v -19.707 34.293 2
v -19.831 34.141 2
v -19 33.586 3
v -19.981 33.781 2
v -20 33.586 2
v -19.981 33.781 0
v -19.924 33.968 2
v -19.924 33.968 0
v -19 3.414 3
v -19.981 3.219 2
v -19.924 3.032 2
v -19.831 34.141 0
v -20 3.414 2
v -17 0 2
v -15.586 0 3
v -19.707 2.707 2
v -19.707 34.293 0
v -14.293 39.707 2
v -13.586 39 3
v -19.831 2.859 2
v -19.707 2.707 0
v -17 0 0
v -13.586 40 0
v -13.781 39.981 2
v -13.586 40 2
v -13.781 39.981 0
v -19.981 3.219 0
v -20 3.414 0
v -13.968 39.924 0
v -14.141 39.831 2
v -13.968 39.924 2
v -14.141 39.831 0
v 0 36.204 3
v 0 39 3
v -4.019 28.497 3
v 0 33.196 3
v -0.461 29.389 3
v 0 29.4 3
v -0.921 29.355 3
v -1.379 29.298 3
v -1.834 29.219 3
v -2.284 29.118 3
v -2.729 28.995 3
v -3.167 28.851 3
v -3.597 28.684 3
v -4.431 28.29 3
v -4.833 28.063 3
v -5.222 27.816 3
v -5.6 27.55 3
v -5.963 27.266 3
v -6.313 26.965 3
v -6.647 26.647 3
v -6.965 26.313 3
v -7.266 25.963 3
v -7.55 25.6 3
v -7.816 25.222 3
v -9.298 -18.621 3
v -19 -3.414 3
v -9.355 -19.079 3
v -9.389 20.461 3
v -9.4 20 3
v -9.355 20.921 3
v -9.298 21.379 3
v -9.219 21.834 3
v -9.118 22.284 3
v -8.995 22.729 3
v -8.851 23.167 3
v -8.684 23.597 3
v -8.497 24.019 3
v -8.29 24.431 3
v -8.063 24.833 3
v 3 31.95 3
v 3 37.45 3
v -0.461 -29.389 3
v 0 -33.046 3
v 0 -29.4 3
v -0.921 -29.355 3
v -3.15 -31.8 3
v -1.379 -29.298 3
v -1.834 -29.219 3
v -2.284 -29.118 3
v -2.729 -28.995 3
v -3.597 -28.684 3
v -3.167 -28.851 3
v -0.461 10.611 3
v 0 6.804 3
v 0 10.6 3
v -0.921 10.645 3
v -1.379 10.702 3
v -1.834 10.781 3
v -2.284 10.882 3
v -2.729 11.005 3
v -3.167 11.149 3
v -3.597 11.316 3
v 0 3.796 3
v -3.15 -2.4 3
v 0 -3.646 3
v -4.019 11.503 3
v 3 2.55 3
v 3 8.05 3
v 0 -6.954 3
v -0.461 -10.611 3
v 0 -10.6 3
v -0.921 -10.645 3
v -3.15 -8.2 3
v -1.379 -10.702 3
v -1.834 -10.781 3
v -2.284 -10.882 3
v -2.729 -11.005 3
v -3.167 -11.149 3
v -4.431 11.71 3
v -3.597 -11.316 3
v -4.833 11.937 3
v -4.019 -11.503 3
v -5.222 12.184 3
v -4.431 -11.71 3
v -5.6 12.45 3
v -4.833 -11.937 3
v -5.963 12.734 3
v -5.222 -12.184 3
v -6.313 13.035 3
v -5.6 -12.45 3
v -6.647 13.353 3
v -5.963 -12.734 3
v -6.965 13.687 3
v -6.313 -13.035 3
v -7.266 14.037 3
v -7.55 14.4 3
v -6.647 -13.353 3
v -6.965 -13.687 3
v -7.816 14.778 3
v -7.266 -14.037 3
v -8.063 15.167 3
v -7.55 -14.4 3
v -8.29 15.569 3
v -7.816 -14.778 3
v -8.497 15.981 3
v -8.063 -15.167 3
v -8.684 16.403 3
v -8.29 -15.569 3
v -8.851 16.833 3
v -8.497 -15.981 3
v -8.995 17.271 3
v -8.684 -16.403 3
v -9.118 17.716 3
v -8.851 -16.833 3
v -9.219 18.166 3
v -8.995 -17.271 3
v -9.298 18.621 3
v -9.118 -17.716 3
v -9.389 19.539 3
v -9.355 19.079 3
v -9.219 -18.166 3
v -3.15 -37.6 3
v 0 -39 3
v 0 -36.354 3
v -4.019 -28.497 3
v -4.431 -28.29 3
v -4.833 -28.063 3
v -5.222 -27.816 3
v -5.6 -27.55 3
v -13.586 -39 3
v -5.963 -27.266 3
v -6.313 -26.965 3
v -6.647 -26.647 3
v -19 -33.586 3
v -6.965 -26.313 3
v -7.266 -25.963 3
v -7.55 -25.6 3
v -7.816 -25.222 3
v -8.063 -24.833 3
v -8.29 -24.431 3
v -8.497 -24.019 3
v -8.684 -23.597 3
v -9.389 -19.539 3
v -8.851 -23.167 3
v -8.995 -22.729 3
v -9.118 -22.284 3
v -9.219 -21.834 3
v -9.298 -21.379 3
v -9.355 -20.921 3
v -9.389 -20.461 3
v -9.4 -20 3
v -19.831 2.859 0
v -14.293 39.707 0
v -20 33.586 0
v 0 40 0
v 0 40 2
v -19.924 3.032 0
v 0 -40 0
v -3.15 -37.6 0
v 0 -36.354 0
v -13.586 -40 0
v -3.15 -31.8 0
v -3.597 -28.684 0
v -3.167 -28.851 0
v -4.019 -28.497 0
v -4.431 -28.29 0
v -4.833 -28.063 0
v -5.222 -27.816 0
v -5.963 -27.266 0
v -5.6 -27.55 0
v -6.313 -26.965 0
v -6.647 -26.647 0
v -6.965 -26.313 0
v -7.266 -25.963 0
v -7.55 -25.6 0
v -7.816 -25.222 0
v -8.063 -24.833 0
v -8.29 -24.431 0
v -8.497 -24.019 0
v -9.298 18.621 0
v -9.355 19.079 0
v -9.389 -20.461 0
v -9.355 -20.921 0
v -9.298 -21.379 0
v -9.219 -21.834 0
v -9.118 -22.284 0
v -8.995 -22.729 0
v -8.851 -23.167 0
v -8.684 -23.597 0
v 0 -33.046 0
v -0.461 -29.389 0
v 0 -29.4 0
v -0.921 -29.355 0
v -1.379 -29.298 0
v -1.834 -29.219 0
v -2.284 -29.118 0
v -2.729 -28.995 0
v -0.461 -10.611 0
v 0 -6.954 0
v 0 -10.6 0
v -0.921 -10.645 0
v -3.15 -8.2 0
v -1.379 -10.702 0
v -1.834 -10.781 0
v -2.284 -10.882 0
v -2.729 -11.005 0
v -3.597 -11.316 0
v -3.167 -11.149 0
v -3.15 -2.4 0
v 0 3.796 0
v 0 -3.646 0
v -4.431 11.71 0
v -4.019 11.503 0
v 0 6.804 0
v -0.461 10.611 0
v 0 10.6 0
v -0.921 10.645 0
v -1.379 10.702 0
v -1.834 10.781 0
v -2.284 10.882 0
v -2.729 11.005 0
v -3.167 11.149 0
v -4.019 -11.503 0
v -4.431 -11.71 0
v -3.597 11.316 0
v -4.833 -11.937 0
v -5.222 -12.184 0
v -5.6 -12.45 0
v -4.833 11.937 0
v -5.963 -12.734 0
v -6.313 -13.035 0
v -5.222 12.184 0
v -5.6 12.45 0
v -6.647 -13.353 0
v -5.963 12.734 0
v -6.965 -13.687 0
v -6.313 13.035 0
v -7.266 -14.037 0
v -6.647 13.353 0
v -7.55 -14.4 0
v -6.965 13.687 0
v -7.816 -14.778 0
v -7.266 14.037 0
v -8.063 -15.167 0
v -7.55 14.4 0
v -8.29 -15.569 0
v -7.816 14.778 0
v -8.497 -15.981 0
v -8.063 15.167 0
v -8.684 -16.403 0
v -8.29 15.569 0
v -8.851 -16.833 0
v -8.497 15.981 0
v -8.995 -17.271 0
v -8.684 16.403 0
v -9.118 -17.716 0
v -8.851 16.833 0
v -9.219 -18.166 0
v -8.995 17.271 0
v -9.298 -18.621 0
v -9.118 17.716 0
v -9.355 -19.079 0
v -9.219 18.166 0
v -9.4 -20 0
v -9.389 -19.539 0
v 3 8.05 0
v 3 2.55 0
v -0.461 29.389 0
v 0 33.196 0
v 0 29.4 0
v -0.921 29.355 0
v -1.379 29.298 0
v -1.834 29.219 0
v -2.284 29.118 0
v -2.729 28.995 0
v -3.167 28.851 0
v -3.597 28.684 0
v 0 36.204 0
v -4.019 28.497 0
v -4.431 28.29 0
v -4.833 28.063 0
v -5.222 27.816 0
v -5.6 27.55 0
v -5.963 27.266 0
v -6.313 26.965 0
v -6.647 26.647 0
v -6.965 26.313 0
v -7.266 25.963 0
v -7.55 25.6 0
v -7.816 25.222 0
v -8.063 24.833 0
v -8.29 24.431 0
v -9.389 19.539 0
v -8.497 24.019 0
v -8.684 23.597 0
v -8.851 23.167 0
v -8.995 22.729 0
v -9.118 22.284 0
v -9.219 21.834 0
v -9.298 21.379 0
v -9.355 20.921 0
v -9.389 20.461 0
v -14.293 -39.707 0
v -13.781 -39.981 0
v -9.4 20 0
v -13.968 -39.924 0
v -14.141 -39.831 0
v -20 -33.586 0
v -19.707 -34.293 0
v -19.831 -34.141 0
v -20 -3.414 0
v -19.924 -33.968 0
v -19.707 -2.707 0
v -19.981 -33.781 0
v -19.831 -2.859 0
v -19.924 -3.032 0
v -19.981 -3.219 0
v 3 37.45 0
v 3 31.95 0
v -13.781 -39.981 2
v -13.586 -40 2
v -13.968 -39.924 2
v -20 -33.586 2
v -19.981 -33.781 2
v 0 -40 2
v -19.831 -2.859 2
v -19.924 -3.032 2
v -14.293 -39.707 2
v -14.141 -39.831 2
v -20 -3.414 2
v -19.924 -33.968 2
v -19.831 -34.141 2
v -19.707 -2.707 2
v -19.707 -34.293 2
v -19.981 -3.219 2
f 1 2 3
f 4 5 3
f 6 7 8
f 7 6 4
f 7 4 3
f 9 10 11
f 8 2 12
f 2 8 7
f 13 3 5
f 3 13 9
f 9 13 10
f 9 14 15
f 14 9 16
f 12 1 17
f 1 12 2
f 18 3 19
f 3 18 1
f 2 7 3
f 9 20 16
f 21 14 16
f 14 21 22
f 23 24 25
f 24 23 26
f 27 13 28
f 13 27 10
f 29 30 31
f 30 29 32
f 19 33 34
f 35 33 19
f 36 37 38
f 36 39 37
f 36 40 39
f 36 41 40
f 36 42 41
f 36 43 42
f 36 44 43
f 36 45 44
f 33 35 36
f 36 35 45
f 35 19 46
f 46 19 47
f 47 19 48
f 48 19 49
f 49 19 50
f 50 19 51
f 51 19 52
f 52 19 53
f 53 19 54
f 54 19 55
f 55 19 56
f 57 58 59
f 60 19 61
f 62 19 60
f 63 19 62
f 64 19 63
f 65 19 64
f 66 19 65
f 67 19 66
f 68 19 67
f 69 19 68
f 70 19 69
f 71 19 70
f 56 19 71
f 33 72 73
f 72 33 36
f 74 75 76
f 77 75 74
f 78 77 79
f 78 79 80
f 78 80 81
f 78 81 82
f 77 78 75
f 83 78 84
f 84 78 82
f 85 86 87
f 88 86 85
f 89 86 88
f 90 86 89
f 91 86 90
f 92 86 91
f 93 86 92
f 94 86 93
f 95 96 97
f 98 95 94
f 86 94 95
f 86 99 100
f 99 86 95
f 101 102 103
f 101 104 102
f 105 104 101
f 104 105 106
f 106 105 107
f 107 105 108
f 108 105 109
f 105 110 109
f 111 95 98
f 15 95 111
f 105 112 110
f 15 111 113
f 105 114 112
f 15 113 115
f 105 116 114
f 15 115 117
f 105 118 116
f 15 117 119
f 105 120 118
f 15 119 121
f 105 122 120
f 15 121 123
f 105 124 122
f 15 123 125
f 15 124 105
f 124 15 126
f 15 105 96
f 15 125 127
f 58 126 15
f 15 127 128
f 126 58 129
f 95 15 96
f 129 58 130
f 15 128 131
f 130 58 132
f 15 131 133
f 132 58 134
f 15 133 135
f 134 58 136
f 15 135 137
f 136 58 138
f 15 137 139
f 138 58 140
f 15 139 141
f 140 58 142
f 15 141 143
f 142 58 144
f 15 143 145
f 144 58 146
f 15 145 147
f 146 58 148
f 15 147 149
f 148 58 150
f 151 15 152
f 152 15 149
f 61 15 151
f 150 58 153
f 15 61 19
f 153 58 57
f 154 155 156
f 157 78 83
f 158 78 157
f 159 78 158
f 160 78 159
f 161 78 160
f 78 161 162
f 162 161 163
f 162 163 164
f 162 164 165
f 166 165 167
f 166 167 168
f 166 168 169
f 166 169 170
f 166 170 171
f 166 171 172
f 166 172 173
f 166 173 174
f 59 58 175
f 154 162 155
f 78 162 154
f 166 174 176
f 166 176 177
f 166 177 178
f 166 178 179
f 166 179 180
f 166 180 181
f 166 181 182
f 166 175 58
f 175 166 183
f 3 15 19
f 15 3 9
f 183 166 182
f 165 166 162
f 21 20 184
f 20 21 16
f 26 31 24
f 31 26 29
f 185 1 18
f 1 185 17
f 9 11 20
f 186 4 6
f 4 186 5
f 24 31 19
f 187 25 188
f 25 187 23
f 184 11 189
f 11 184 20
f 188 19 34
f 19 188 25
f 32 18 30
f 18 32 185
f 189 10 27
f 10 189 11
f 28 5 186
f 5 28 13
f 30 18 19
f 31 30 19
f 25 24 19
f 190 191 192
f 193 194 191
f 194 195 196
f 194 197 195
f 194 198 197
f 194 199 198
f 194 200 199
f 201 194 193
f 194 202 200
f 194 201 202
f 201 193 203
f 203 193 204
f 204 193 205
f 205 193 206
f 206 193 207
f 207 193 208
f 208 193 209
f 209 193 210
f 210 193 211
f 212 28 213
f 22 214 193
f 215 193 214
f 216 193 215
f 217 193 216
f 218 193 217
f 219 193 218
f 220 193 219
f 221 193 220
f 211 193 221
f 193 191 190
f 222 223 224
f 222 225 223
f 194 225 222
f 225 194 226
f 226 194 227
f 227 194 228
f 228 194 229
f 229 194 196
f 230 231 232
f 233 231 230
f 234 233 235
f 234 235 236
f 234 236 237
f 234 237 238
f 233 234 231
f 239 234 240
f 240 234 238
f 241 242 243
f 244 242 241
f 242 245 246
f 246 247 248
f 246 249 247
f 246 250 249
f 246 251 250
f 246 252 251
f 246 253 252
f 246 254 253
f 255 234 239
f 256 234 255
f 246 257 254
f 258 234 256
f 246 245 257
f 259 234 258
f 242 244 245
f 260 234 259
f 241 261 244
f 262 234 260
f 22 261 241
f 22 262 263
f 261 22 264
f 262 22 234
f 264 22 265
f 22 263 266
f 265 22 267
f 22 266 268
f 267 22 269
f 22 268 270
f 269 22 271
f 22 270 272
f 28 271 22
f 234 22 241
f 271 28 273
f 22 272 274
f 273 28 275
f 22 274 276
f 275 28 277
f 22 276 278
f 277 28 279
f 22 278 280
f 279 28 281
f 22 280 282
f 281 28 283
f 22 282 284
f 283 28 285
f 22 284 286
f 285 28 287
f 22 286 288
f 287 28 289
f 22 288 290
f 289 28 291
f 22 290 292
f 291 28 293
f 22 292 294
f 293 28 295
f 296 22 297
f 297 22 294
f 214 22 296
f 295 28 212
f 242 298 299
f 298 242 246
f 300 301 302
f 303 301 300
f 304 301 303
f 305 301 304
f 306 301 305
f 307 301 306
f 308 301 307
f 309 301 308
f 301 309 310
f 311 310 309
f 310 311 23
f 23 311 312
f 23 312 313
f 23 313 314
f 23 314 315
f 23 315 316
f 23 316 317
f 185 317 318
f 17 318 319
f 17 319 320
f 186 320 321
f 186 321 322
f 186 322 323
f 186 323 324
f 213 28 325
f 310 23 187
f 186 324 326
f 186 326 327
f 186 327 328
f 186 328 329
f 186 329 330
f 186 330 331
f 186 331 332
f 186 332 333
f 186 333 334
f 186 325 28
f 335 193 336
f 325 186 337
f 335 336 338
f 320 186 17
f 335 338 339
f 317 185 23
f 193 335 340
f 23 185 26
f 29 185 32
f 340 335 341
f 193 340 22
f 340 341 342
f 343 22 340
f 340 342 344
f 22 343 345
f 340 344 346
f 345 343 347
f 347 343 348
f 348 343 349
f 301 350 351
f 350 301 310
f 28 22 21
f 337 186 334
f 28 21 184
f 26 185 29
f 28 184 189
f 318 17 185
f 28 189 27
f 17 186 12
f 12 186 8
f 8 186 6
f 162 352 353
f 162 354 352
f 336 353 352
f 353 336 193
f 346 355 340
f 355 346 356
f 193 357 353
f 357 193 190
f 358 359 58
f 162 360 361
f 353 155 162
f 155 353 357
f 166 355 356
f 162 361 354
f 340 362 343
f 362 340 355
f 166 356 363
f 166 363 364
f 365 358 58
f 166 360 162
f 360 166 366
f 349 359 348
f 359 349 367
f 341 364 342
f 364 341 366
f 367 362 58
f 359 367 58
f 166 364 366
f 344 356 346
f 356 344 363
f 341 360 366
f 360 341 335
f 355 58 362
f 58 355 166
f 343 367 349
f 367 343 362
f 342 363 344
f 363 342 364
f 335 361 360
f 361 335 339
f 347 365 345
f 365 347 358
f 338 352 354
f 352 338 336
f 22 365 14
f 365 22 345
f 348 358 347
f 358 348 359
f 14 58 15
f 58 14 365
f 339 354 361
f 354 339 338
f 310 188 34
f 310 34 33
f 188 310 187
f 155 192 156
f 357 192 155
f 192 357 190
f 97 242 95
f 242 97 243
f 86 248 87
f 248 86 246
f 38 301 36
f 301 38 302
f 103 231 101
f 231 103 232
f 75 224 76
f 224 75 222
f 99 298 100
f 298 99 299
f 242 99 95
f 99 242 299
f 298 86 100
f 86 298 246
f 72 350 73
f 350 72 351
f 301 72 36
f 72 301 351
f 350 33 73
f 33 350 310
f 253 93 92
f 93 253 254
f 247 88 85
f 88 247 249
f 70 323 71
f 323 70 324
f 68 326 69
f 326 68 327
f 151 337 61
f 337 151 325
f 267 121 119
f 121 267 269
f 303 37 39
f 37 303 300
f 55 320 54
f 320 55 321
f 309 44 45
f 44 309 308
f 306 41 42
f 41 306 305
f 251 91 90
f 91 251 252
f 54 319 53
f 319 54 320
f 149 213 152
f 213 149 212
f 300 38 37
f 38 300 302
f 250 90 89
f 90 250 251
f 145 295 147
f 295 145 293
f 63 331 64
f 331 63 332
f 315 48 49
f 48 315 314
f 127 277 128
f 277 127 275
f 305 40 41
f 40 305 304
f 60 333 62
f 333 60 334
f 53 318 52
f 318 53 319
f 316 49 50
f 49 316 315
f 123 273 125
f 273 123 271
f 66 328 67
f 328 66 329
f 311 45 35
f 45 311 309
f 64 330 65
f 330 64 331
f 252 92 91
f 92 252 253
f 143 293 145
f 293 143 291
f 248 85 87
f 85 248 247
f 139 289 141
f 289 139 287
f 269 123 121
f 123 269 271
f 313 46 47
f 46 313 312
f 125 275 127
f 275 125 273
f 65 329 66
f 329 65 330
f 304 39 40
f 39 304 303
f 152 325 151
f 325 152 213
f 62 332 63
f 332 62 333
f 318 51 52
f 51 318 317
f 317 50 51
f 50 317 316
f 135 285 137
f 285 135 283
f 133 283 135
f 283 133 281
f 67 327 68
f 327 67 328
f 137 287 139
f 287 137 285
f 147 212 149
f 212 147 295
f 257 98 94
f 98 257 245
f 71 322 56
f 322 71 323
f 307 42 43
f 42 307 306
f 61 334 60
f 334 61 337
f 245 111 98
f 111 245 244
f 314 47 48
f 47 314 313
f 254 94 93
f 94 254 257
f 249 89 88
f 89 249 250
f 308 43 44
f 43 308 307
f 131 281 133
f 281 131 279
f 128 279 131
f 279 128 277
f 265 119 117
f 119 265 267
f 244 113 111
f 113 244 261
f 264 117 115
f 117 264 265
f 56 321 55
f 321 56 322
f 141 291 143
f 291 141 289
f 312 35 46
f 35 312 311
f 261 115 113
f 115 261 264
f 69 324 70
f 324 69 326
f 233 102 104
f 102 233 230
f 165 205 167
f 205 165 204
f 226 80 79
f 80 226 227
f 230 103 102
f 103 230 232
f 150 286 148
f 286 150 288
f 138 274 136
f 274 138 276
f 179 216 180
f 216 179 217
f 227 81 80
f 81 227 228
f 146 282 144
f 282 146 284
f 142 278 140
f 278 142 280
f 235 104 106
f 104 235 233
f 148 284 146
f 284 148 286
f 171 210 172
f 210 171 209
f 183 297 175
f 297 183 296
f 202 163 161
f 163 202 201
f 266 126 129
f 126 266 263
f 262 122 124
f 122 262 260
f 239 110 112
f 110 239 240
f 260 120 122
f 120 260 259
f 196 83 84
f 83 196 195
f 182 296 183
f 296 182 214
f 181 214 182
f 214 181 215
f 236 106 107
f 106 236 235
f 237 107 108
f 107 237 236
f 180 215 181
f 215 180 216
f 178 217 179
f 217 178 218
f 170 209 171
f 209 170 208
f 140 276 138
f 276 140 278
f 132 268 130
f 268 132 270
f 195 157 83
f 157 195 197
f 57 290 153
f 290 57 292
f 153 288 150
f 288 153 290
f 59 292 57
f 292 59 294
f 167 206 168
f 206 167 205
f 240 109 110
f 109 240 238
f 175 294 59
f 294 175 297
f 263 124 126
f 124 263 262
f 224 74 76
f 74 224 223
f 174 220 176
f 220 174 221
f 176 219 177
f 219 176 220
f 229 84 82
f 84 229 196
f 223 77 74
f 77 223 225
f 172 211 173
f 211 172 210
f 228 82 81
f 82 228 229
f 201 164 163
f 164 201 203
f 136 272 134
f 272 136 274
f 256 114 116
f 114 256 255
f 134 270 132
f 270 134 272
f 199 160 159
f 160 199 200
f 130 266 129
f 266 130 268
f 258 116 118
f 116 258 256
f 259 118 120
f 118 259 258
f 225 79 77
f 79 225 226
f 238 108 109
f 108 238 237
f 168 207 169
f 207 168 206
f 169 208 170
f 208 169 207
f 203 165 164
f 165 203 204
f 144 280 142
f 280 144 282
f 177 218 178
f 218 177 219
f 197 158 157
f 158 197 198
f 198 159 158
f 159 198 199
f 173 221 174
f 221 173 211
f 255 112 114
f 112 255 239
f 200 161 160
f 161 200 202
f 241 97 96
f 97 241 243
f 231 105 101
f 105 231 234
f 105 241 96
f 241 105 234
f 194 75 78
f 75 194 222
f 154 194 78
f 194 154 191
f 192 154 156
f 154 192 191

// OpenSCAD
// Parametrisk täckplatta (rosett) för väggenomföring av dubbla radiatorrör
// Två IDENTISKA halvor (skriv ut 2 st), delning genom rörens centrum.
// Fog: genomgående laxstjärt (dovetail) i skarven, skjuts ihop längs rören.
// Inget som böjs -> PETG-säkert. Halvorna skrivs ut platt (framsida upp) utan support.
// part = "half" | "assembled" | "exploded" | "print"
part = "half";

/* [Rör] */
pipe_preset = 18;      // 15 | 18 | 22 (Cu EN 1057)
pipe_d_custom = 0;     // >0 åsidosätter preset
pipe_clearance = 0.8;  // spel på diametern (0.5-1)
cc = 40;               // centrumavstånd (samma som rörhållaren)
/* [Platta] */
width_preset = 40;     // 40 | 50 | 60 (bredd tvärs rören)
width_custom = 0;      // >0 åsidosätter preset
height_custom = 0;     // >0 åsidosätter standard (cc + bredd)
thick_preset = 3;      // 3 | 5
thick_custom = 0;      // >0 åsidosätter preset
edge_chamfer_custom = -1; // >=0 åsidosätter; annars 1 mm vid <=3 mm, 1.5 mm vid 5 mm
corner_chamfer_custom = -1; // >=0 åsidosätter; annars 3 med skruvhål, 6 utan (tejp oförändrad). liten så den inte krockar med skruvhålen
waist_notch = 3;       // V-midja mellan rören per sida, 0 = rak
/* [Fog: laxstjärt] */
dt_neck = 3;           // halsbredd i skarven
dt_head = 5.5;         // huvudets bredd
dt_depth = 3;          // hur långt in i motsatt halva
dt_tol = 0.15;         // spel per sida (lätt presspassning)
dt_mid_custom = 0;     // >0 åsidosätter; annars (cc-hål)/4, ryms även för 22 mm
/* [Skruvhål (standard: dubbelhäftande tejp, platt baksida)] */
screw_holes = false;
screw_size = "ws3.0";  // träskruv, försänkt huvud: "ws3.0" | "ws3.5" | "ws4.0" (även "M2.5", "M3.5")
// Huvud-Ø enligt DIN 7997 dk nom: 3.0->5.6, 3.5->6.5, 4.0->7.5 (fasten.it/en/norms/norm/din_7997);
// fickan görs ~0.4-0.5 större så huvudet går i plan även för spånskivsskruv (~6/7/8).
screw_hole_d_custom = 0; // >0 åsidosätter
screw_head_d_custom = 0; // >0 åsidosätter (90° försänkning)
min_floor = 1.2;
screw_inset_custom = 0; // >0 åsidosätter; annars max(4.5, minsta som ger 1.2 mm kantmarginal i ovanytan)
min_margin = 1.2;       // minsta raka hålparti under försänkningen
explode = 12;
$fn = 128;

corner_chamfer = corner_chamfer_custom >= 0 ? corner_chamfer_custom : (screw_holes ? 2 : 6);
thick = thick_custom > 0 ? thick_custom : thick_preset;
edge_chamfer = edge_chamfer_custom >= 0 ? edge_chamfer_custom : (thick <= 3 ? 1 : 1.5);
pipe_d = pipe_d_custom > 0 ? pipe_d_custom : pipe_preset;
hole_d = pipe_d + pipe_clearance;
W = width_custom > 0 ? width_custom : width_preset;
H = height_custom > 0 ? height_custom : cc + W;
dt_mid = dt_mid_custom > 0 ? dt_mid_custom : (cc - hole_d)/4;
ends = cc/2 + hole_d/2;                 // rörhålets kant
dt_end = (ends + H/2) / 2;              // mitt i ändpartiet
assert(H/2 - ends >= dt_head + 2, "För kort ändparti för fogen – öka höjden");
assert(2*dt_mid >= dt_head + 2*dt_tol + 1 && dt_mid + dt_head/2 + dt_tol <= (cc-hole_d)/2 - 1, "För litet avstånd mellan rören för fogen");
assert(W/2 - dt_depth >= 4, "För smal platta för fogen");

// [namn, hål, försänkning]
SCREWS = [["ws3.0",3.3,6.0],["ws3.5",3.8,7.0],["ws4.0",4.3,8.0],["M2.5",2.7,5],["M3.5",3.8,7]];
scr = SCREWS[search([screw_size], SCREWS)[0]];
screw_hole_d = screw_hole_d_custom > 0 ? screw_hole_d_custom : scr[1];
screw_head_d = screw_head_d_custom > 0 ? screw_head_d_custom : scr[2];
cs_depth = min((screw_head_d - screw_hole_d)/2, thick - min_floor);
cs_top_d = screw_hole_d + 2*cs_depth;   // faktisk försänkningsdiameter i ytan
if (screw_holes) echo(str("COUNTERSINK depth=",cs_depth," floor_left=",thick-cs_depth, cs_top_d < screw_head_d ? str("  VARNING: försänkningen begränsad till Ø",cs_top_d," (min_floor) – huvudet sticker upp") : ""));
screw_inset = screw_inset_custom > 0 ? screw_inset_custom : max(4.5, ceil((cs_top_d/2 + edge_chamfer + min_margin)*10)/10);
screw_pos = [[-W/2+screw_inset, H/2-screw_inset], [-W/2+screw_inset, -H/2+screw_inset]];
// marginaler från försänkningens kant (i ovanytan, efter kantfas)
m_edge = screw_inset - cs_top_d/2 - edge_chamfer;
m_chamf = (2*screw_inset - corner_chamfer)/sqrt(2) - cs_top_d/2 - edge_chamfer;
m_pipe = norm([screw_inset - W/2, H/2-screw_inset - cc/2]) - hole_d/2 - cs_top_d/2;
m_dt = (W/2 - screw_inset - cs_top_d/2) - (dt_depth + dt_tol);
echo(str("SCREW ",screw_size," hole=",screw_hole_d," cs=",cs_top_d," inset=",screw_inset," corner_chamfer=",corner_chamfer));
echo(str("MARGINS edge=",m_edge," chamfer=",m_chamf," pipe=",m_pipe," dovetail=",m_dt, " cs_top_d=",cs_top_d));
if (screw_holes) assert(min(m_edge, m_chamf, m_pipe, m_dt) >= min_margin, "För lite material runt försänkningen");
module screw_cut() {
  translate([0,0,-1]) cylinder(d=screw_hole_d, h=thick+2, $fn=48);
  translate([0,0,thick-cs_depth]) cylinder(d1=screw_hole_d, d2=cs_top_d, h=cs_depth+0.001, $fn=48);
  translate([0,0,thick]) cylinder(d=cs_top_d, h=1, $fn=48);
}
module outline() {
  c = corner_chamfer; n = waist_notch;
  polygon([[-W/2+c,-H/2],[W/2-c,-H/2],[W/2,-H/2+c],[W/2,-n],[W/2-n,0],[W/2,n],[W/2,H/2-c],
           [W/2-c,H/2],[-W/2+c,H/2],[-W/2,H/2-c],[-W/2,n],[-W/2+n,0],[-W/2,-n],[-W/2,-H/2+c]]);
}
module plate() {
  ch = edge_chamfer;
  minkowski() {
    linear_extrude(thick - ch) offset(delta=-ch) outline();
    cylinder(h=ch, r1=ch, r2=0, $fn=4*8);
  }
}
// laxstjärtsprofil, x=0 i skarven, pekar mot +x, s=extra per sida
module dt2d(s) {
  polygon([[-0.01, -dt_neck/2 - s], [dt_depth + s, -dt_head/2 - s],
           [dt_depth + s, dt_head/2 + s], [-0.01, dt_neck/2 + s]]);
}
module dt3d(s) translate([0,0,-1]) linear_extrude(thick + 2) dt2d(s);
// Halva på -x-sidan; tappar vid +y pekar in i +x, spår vid -y.
module half() {
  difference() {
    union() {
      intersection() { plate(); translate([-W, -H, -1]) cube([W, 2*H, thick + 2]); }
      intersection() {
        for (y = [dt_mid, dt_end]) translate([0, y, 0]) linear_extrude(thick) dt2d(0);
        plate();
      }
    }
    for (y = [cc/2, -cc/2]) translate([0, y, -1]) cylinder(d=hole_d, h=thick + 2);
    if (screw_holes) for (p = screw_pos) translate([p[0], p[1], 0]) screw_cut();
    for (y = [-dt_mid, -dt_end]) translate([0, y, 0]) mirror([1,0,0]) dt3d(dt_tol);
  }
}
module other() rotate([0,0,180]) half();
if (part == "half") half();
else if (part == "assembled") { color("white") half(); color("lightgrey") other(); }
else if (part == "exploded") { color("white") half(); color("orange") translate([0,0,explode*2]) other(); }
else if (part == "print") { translate([-dt_depth-3,0,0]) half(); translate([dt_depth+3,0,0]) other(); }
